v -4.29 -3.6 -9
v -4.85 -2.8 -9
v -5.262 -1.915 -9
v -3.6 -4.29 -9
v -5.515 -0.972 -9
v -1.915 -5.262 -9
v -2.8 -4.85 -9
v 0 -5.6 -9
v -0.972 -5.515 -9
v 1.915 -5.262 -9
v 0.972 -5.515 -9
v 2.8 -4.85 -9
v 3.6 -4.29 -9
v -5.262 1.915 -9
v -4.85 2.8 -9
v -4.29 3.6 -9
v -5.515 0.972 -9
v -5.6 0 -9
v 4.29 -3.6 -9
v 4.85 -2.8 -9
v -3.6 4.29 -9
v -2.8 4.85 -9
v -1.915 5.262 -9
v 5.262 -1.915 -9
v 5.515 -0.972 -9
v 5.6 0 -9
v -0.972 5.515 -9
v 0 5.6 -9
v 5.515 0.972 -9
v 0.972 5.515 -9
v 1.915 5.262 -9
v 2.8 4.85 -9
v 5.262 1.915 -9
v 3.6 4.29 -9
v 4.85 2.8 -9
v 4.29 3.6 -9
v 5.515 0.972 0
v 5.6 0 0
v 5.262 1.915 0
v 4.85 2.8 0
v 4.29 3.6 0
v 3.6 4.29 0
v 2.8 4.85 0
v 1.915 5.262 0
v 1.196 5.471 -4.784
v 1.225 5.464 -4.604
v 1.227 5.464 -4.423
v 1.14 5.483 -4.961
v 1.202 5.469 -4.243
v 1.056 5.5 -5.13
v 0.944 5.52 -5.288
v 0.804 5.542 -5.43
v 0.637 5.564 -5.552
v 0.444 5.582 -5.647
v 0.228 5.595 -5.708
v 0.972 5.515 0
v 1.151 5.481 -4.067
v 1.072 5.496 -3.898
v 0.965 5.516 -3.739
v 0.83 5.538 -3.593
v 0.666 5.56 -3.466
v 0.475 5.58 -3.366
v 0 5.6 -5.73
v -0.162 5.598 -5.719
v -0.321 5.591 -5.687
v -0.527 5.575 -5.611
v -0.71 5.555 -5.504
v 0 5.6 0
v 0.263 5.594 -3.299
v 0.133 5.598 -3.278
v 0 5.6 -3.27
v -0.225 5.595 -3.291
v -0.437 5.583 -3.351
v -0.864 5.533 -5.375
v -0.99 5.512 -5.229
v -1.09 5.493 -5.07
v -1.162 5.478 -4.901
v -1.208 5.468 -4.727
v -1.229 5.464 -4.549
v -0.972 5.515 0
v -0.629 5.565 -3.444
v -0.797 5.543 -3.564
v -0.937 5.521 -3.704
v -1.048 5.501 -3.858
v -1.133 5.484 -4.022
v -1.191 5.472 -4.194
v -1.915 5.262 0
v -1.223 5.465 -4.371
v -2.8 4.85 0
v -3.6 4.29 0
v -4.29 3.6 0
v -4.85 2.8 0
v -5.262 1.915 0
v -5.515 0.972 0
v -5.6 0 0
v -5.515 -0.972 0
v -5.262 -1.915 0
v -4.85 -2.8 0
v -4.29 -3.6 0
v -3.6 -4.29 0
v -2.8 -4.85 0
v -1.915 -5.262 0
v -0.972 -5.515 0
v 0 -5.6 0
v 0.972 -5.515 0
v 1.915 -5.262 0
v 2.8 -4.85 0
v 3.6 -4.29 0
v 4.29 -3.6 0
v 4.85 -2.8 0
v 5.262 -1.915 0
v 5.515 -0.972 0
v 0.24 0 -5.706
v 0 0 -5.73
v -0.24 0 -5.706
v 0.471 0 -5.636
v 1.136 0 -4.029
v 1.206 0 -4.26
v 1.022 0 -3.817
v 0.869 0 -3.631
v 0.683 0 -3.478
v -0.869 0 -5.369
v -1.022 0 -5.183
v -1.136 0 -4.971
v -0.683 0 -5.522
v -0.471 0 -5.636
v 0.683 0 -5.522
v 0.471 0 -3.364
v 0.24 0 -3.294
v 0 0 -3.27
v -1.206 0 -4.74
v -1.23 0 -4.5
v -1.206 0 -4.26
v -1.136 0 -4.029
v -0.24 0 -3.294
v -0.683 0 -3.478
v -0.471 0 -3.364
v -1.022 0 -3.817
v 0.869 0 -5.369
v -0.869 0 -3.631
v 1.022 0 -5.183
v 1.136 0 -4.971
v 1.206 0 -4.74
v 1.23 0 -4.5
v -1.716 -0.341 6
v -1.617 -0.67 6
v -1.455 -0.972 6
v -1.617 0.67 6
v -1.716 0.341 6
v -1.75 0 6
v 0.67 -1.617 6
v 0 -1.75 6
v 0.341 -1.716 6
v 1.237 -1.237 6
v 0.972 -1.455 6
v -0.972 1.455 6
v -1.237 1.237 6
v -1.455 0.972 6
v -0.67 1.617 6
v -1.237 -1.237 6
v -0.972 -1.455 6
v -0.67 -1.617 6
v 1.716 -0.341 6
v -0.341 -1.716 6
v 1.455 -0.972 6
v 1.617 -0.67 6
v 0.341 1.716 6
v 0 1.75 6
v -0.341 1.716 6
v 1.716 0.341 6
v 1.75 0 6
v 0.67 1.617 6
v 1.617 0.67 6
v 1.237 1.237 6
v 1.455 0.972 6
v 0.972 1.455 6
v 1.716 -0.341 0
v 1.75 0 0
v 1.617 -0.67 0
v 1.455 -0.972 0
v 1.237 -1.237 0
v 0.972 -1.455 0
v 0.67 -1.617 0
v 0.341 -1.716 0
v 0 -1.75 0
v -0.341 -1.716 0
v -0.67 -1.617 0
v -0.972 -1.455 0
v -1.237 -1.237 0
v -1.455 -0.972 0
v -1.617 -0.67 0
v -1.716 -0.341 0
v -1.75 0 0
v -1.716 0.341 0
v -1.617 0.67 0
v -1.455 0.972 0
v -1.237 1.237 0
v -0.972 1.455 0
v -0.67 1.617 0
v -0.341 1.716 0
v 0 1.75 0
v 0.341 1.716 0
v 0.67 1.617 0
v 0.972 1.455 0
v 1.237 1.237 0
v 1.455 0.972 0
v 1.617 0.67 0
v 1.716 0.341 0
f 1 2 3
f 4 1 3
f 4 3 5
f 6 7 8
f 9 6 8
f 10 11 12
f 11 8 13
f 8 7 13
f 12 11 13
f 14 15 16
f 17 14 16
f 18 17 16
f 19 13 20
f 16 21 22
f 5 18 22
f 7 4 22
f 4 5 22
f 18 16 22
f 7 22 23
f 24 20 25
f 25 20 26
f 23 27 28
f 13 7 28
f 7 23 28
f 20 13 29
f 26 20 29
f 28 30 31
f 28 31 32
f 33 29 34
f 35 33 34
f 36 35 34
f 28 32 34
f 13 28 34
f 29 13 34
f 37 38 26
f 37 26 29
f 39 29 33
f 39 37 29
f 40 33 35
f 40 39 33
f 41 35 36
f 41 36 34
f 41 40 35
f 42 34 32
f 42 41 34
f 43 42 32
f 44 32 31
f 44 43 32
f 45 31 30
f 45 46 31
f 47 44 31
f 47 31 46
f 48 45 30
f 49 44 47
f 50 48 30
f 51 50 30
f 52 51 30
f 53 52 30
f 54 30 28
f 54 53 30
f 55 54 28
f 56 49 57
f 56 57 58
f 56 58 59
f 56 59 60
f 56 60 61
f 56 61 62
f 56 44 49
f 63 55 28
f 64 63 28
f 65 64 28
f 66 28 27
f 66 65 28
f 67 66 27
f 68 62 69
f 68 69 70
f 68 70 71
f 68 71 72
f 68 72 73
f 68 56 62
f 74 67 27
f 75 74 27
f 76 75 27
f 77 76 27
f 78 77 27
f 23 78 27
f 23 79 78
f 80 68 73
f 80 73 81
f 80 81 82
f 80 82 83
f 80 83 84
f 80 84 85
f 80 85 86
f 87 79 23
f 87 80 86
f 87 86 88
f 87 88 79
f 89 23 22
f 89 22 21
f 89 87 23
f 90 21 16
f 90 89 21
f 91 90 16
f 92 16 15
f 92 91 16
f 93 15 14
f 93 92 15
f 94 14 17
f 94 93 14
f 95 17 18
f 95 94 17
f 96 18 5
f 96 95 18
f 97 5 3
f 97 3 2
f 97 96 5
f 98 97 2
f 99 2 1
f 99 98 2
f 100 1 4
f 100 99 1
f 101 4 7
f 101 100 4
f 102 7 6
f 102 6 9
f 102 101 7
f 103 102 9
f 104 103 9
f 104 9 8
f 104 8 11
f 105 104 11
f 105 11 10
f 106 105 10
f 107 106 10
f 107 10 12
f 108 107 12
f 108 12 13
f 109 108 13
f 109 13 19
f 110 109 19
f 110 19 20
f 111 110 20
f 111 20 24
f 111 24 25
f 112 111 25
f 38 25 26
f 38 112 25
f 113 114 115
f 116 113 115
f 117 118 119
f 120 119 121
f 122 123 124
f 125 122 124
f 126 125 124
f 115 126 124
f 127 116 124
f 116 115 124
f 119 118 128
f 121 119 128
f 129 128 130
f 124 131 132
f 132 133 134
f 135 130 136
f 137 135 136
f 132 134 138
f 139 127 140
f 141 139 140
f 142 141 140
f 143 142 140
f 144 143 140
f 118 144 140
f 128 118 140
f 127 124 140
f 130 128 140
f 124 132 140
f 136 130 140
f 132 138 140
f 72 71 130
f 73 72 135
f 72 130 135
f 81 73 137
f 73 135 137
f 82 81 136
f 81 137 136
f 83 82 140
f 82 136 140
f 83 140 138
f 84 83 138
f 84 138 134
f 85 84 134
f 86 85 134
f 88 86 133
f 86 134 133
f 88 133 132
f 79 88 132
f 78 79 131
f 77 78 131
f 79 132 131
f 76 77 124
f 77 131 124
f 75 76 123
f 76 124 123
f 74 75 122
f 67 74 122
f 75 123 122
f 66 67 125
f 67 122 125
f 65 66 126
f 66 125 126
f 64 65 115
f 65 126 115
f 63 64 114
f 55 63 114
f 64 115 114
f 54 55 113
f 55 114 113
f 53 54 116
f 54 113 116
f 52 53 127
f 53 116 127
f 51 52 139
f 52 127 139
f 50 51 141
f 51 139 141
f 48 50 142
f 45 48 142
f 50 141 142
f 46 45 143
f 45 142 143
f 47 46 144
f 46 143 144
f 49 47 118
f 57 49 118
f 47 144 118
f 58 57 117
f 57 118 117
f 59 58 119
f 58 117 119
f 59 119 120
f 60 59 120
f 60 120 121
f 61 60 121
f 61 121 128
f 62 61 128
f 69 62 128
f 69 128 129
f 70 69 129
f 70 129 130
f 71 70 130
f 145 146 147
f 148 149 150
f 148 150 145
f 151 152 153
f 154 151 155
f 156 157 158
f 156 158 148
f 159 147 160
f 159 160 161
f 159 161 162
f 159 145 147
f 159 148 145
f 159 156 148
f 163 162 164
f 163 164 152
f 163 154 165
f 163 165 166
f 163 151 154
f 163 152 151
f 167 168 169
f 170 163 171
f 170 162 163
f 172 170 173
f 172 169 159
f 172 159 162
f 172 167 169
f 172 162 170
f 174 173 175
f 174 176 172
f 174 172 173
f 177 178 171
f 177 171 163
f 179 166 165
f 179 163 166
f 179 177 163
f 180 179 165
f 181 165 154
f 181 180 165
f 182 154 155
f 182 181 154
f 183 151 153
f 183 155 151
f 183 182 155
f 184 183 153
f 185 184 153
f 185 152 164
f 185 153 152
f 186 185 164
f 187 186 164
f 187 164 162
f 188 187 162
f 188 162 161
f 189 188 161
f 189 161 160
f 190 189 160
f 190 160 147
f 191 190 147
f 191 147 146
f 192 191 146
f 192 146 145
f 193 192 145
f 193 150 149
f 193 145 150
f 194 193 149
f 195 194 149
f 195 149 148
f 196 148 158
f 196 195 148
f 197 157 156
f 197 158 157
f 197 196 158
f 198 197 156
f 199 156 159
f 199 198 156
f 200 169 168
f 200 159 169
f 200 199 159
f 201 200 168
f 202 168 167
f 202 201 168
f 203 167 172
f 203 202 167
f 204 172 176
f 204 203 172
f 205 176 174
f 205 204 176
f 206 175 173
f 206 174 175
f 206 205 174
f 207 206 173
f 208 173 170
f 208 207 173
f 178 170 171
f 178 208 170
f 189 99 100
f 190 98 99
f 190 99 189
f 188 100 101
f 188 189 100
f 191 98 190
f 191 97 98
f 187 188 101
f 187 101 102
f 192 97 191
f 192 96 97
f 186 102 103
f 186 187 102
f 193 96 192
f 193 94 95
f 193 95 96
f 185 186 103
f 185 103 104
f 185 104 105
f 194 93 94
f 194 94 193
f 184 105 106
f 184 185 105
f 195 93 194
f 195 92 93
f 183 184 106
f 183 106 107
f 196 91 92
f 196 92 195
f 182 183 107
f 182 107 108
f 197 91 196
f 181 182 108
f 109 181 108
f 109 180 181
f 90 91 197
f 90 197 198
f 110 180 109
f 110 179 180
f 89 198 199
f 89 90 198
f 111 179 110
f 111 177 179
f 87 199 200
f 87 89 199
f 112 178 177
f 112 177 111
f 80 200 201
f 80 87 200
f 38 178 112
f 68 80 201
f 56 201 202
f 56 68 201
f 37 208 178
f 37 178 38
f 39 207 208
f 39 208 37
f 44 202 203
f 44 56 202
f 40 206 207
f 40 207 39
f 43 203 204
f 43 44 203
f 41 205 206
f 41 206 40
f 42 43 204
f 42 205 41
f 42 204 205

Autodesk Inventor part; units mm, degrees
ref_plane "YZ Plane" through (0, 0, 0) normal (1, 0, 0) x (0, 1, 0)
ref_plane "XZ Plane" through (0, 0, 0) normal (0, 1, 0) x (-1, 0, 0)
sketch "Sketch1" plane through (0, 0, 0) normal (0, 0, 1) x (1, 0, 0)
  circle A0 centre (0, 0) radius 5.6
  dimension "d0" = 11.2
extrude "Extrusion1" add sketch "Sketch1" against normal blind 9
ref_plane "Work Plane1" through (-5.6, 5.6, 0) normal (0, 1, 0) x (1, 0, 0)
sketch "Sketch3" plane through (-5.6, 5.6, 0) normal (0, 1, 0) x (1, 0, 0)
  circle A0 centre (5.6, 4.5) radius 1.2
  point P0 (5.6, 0)
  dimension "d9" = 2.4
hole "Hole1" at (0, 5.6, -4.5) direction (0, -1, 0) diameter 2.459 depth 5.6 thread size "M3x0.5" designation "M3" class "6H" standard "GB Metric profile"
sketch "Sketch4" plane through (0, 0, 0) normal (0, 0, 1) x (1, 0, 0)
  circle A0 centre (0, 0) radius 5.6 projected
  circle A1 centre (0, 0) radius 1.75
  dimension "d17" = 3.5
extrude "Extrusion3" add sketch "Sketch4" along normal blind 6 contours A1
properties part number "gear motor"
